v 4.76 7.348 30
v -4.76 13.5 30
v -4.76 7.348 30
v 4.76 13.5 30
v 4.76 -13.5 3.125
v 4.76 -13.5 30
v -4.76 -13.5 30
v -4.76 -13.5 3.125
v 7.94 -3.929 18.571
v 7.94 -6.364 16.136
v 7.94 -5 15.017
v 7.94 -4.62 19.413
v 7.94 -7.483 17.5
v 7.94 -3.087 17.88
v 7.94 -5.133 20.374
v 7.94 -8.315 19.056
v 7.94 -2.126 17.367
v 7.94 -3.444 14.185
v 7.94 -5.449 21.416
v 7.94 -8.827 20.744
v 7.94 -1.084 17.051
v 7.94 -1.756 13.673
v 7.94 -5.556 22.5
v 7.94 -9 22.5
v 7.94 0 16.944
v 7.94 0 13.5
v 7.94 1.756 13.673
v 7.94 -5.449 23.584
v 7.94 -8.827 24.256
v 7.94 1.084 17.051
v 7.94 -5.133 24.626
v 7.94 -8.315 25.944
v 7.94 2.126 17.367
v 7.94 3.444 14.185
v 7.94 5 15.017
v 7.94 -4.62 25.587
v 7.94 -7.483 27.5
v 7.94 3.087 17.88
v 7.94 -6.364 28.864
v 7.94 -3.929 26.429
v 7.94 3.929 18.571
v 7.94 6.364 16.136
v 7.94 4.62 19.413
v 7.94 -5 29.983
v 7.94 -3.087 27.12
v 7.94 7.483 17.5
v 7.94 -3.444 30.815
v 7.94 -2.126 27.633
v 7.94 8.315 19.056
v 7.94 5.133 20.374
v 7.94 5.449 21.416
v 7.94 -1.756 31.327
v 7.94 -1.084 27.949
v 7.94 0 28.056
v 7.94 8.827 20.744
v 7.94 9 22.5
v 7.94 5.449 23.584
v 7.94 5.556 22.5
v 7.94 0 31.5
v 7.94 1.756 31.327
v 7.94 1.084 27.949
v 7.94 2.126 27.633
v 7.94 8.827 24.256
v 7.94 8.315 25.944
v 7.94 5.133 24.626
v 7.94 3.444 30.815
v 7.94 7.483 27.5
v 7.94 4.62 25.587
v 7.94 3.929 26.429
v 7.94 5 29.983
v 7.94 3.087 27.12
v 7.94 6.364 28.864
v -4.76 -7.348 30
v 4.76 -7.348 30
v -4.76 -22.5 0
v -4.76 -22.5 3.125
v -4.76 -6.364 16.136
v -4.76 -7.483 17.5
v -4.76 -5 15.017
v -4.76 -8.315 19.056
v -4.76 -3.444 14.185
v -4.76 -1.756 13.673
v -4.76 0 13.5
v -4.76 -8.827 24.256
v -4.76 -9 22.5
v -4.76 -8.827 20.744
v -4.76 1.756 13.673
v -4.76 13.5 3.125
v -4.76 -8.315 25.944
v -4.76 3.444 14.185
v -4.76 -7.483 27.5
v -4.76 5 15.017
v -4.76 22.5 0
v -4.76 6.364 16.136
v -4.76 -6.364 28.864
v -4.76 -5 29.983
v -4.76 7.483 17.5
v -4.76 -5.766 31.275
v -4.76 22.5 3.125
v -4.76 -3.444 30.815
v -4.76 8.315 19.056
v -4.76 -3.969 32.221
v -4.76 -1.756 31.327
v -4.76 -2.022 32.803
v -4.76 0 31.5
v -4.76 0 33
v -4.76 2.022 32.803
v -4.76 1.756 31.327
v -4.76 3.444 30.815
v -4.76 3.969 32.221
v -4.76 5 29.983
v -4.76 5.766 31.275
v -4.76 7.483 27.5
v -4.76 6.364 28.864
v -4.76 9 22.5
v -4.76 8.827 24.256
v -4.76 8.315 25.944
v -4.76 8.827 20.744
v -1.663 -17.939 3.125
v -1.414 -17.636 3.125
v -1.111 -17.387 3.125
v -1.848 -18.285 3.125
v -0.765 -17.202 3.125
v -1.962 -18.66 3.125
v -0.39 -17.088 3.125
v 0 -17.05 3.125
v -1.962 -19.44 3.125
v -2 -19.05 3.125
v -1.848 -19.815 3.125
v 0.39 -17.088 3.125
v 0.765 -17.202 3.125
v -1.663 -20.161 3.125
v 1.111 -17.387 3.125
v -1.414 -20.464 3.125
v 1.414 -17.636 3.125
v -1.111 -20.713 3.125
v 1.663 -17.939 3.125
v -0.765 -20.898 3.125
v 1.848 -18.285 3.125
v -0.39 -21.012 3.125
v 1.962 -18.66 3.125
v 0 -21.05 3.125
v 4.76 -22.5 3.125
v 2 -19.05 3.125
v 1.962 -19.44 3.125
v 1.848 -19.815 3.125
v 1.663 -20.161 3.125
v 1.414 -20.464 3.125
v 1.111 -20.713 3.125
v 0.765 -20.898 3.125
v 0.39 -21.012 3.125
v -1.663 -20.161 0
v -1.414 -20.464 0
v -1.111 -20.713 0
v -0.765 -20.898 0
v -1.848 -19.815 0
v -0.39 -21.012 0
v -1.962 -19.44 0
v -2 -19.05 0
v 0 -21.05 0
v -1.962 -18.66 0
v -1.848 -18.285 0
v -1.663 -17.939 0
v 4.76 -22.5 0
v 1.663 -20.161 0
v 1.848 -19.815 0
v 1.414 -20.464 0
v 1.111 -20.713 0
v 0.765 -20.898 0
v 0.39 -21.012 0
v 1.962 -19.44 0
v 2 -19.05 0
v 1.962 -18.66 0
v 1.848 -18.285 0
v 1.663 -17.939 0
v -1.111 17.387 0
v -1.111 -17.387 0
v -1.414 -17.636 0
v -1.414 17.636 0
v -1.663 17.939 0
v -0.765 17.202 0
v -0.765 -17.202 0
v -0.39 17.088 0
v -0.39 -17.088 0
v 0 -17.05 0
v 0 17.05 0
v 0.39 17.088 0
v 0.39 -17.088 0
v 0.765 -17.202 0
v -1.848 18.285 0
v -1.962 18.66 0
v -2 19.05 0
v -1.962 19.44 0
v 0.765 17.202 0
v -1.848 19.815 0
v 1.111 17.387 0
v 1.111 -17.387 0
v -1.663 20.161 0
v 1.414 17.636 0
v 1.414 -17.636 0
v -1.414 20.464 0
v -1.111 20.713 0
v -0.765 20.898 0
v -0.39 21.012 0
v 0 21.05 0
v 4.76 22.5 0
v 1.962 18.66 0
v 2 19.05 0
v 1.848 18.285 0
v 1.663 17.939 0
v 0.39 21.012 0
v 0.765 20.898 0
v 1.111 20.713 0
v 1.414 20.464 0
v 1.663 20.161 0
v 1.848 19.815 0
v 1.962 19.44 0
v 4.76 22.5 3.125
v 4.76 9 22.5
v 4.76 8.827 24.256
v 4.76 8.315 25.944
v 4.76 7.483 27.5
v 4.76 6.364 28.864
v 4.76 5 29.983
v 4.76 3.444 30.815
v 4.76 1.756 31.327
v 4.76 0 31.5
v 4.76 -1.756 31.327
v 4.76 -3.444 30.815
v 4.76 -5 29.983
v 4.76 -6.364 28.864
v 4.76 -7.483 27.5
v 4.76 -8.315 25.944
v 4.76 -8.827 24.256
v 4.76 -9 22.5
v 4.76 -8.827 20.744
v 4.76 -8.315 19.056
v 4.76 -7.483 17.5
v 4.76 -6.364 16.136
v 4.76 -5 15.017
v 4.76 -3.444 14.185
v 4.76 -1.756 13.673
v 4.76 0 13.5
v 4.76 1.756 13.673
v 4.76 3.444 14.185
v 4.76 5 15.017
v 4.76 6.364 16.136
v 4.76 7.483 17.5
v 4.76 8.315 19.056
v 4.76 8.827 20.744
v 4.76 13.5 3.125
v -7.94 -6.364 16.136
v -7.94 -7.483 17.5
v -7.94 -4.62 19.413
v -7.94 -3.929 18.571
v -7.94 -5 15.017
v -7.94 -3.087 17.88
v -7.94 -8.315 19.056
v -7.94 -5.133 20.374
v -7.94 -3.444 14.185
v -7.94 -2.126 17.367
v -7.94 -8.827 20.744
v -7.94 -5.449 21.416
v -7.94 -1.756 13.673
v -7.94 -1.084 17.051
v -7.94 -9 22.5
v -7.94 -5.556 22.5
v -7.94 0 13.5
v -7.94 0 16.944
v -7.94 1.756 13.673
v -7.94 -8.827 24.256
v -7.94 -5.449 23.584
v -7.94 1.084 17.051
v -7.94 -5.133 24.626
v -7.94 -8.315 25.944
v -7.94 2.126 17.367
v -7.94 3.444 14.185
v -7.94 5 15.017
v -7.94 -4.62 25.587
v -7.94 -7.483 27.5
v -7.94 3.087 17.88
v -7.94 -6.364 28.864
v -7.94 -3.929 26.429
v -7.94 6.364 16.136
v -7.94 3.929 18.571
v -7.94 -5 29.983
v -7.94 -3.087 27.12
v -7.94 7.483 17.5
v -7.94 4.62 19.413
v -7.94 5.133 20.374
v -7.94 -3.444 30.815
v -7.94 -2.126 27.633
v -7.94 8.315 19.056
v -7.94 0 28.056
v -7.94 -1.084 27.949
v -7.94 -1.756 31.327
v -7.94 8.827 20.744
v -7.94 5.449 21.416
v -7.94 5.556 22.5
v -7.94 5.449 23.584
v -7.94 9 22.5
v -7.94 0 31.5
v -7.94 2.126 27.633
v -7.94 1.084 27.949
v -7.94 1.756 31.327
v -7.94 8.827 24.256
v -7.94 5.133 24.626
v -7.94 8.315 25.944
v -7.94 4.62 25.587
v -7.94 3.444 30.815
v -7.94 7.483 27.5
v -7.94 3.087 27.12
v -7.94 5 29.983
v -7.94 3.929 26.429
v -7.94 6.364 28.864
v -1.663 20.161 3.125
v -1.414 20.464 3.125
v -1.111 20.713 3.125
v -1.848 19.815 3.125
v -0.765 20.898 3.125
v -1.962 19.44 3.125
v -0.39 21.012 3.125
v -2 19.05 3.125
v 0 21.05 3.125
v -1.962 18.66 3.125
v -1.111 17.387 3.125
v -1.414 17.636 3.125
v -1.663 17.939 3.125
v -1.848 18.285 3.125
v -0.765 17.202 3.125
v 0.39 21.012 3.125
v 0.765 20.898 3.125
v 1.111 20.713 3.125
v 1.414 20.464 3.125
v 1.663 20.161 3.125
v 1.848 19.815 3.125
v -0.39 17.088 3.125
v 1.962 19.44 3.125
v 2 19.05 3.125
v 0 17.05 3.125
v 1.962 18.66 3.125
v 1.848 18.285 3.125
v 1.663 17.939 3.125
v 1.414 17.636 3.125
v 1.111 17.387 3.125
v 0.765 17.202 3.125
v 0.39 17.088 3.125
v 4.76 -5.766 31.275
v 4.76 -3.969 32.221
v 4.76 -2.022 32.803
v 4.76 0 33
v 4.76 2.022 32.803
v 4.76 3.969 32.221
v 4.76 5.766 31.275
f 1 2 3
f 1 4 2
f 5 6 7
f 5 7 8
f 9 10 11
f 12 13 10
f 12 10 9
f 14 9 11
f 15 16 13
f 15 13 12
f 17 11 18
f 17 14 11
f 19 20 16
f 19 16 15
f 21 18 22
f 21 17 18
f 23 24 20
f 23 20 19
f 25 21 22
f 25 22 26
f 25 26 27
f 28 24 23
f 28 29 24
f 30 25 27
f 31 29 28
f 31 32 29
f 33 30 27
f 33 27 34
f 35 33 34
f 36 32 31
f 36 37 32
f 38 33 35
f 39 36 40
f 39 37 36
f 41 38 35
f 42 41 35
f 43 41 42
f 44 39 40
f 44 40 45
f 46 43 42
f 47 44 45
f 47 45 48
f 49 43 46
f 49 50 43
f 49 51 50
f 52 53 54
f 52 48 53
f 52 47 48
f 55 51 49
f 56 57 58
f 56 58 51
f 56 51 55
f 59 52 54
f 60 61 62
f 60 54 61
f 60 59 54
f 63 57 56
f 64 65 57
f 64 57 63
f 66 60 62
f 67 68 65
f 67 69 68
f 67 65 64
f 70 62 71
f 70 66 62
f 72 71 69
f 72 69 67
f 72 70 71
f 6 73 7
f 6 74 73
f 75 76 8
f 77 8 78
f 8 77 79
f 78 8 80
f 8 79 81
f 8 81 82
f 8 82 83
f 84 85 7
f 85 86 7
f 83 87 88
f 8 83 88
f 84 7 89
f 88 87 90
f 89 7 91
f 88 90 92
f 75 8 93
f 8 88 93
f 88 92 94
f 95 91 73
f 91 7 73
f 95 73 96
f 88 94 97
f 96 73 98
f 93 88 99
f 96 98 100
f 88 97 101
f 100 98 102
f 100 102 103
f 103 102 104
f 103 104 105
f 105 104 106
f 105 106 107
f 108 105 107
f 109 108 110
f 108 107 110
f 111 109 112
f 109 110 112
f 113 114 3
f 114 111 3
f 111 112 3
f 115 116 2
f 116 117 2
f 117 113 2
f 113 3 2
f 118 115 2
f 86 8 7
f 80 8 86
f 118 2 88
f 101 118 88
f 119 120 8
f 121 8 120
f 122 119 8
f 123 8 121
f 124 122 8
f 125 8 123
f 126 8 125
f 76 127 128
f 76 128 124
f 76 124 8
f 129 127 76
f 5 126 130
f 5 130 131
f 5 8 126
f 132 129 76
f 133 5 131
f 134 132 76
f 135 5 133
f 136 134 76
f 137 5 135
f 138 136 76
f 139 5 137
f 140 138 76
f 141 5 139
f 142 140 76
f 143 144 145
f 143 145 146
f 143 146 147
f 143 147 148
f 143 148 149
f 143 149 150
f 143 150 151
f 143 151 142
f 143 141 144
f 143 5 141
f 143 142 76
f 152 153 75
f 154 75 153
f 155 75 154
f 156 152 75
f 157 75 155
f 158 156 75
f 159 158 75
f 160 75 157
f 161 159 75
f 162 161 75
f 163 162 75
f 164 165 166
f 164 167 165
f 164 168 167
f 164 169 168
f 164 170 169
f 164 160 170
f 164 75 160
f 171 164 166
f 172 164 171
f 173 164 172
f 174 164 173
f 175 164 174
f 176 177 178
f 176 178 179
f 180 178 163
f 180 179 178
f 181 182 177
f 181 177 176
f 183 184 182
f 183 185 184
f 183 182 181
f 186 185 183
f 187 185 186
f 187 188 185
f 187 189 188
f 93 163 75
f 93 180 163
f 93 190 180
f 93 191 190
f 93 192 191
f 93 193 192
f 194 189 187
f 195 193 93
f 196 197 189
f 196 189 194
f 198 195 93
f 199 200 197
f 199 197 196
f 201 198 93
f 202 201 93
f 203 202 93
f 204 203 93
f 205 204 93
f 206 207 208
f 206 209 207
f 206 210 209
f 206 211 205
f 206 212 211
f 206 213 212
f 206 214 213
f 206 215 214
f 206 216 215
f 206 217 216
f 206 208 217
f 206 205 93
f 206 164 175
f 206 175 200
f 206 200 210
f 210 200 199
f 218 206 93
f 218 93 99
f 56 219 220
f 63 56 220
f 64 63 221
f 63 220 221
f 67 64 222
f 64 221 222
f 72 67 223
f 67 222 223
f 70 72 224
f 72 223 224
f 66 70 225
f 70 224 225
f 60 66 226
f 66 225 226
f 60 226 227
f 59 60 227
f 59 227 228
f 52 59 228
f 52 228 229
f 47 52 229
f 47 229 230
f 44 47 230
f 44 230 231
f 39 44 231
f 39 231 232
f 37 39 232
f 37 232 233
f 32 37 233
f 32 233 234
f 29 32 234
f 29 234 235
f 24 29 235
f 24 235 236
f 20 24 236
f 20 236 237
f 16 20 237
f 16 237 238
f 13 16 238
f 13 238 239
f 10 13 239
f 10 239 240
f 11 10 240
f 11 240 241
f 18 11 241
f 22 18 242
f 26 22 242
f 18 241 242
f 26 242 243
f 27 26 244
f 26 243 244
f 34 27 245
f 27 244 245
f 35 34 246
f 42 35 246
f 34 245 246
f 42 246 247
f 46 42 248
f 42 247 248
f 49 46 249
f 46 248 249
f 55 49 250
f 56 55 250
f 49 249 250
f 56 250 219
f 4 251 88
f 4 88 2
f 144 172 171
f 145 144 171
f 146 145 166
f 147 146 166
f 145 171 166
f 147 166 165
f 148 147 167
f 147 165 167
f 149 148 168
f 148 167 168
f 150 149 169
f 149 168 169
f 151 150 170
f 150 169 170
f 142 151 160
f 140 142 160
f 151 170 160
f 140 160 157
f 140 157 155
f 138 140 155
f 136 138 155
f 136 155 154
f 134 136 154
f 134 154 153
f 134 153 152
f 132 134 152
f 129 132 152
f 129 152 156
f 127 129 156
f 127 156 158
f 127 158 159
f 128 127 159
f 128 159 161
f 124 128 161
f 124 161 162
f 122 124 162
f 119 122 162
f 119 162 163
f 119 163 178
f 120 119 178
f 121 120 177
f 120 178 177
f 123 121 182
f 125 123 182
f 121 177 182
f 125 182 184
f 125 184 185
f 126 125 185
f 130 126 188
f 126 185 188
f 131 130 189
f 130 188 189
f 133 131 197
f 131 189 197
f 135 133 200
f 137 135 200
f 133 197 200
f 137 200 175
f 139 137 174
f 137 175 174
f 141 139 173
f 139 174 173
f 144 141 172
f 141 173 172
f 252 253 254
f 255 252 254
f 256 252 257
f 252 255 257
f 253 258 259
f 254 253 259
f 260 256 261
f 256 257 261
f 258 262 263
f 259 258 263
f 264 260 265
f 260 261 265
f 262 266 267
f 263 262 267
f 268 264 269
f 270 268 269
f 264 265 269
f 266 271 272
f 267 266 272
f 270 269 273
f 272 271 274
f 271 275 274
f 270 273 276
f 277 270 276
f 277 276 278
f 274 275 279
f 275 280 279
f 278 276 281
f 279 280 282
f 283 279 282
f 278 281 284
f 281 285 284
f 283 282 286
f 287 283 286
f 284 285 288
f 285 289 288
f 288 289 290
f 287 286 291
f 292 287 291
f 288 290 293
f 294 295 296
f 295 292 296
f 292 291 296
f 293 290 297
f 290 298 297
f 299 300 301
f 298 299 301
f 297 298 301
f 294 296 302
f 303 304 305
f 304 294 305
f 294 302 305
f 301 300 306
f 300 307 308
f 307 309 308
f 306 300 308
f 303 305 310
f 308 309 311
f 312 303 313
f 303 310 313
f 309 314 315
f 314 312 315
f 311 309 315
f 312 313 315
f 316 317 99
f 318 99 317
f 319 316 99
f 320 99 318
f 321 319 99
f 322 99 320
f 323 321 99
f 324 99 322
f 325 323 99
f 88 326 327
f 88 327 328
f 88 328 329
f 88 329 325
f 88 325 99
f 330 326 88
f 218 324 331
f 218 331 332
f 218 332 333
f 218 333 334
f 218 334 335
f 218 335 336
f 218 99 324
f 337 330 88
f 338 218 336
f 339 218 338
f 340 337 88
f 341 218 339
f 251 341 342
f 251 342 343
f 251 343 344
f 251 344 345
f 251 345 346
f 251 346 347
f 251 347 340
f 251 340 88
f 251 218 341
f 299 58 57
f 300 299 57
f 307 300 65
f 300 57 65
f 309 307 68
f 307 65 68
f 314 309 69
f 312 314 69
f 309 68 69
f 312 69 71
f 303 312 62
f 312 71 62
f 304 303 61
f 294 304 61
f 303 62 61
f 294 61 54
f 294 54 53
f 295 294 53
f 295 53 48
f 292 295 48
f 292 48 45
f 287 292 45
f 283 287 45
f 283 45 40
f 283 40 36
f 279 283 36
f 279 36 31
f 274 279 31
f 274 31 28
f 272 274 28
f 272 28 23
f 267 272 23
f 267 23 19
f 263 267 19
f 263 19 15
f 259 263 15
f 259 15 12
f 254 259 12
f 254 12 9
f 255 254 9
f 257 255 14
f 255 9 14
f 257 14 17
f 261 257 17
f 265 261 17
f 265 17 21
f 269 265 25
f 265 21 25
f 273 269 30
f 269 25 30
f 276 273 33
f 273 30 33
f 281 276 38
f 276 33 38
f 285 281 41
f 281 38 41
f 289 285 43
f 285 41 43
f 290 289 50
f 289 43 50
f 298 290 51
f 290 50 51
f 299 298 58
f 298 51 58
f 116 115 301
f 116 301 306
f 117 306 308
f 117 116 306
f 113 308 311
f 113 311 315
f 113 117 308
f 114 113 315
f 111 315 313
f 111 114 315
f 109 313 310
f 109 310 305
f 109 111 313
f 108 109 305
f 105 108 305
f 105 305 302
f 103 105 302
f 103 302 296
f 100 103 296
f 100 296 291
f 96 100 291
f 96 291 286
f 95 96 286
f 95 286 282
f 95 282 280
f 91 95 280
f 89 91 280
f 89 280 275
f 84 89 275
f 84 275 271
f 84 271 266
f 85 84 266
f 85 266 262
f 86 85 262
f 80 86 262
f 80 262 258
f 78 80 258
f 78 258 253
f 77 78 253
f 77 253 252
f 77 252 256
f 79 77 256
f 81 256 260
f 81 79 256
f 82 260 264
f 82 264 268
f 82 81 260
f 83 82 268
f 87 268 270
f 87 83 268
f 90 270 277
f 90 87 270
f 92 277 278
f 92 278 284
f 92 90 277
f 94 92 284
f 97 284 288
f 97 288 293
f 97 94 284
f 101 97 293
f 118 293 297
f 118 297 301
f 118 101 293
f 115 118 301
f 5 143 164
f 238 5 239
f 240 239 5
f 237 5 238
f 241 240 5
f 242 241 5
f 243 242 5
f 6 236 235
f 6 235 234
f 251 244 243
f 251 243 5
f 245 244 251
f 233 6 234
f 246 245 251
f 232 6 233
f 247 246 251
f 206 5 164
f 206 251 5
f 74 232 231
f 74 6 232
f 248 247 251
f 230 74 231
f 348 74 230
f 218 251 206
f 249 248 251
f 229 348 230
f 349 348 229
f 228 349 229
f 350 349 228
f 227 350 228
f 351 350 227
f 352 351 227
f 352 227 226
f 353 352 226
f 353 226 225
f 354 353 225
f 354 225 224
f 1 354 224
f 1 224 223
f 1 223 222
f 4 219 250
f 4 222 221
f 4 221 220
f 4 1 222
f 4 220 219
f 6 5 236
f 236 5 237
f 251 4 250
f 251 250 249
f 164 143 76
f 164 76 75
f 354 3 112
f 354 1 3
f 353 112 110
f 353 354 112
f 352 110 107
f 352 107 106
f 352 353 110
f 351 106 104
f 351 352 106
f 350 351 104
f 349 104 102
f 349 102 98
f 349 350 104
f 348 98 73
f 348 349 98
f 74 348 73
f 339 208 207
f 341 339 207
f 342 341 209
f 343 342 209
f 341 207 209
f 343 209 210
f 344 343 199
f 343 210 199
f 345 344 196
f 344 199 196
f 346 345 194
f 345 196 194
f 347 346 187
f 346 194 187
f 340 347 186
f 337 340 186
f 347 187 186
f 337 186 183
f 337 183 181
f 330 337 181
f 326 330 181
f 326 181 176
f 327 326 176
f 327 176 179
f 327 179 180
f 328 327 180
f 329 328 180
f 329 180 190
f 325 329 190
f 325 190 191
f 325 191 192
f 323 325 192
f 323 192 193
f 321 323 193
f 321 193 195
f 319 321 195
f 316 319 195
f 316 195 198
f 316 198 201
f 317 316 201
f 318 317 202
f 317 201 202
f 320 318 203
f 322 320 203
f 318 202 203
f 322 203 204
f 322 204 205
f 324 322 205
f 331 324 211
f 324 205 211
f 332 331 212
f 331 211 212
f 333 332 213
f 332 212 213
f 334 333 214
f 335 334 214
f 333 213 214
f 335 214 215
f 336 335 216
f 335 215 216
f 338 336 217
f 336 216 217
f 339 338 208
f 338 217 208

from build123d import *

# Parameters (mm, degrees)
F1_DEPTH      = 4.76
F1_DEPTH_BACK = 4.76
F2_R          = 9
F3_DEPTH      = 7.94
F3_DEPTH_BACK = 7.94
F4_R          = 5.55625
F5_DEPTH      = 15.881
F6_R          = 2
F7_DEPTH      = 33.001


with BuildPart() as f1:
    # F0 (on Right) → F1 (new body, two sides)
    with BuildSketch(Plane.YZ) as f1_sk:
        with BuildLine():
            Line((-7.348469, 30), (-13.5, 30))
            Line((-13.5, 30), (-13.5, 3.125))
            Line((-13.5, 3.125), (-22.5, 3.125))
            Line((-22.5, 3.125), (-22.5, 0))
            Line((-22.5, 0), (22.5, 0))
            Line((22.5, 0), (22.5, 3.125))
            Line((22.5, 3.125), (13.5, 3.125))
            Line((13.5, 3.125), (13.5, 30))
            Line((13.5, 30), (7.348469, 30))
            ThreePointArc((7.348469, 30), (0, 33), (-7.348469, 30))
        make_face()
    extrude(amount=F1_DEPTH)
    extrude(f1_sk.sketch, amount=-F1_DEPTH_BACK)

    # F2 (on Right) → F3 (join, two sides)
    with BuildSketch(Plane.YZ) as f3_sk:
        with Locations((0, 22.5)):
            Circle(F2_R)
    extrude(amount=F3_DEPTH)
    extrude(f3_sk.sketch, amount=-F3_DEPTH_BACK)

    # F4 (on face) → F5 (cut, through all)
    with BuildSketch(Plane.YZ.offset(7.94)):
        with Locations((0, 22.5)):
            Circle(F4_R)
    extrude(amount=-F5_DEPTH, mode=Mode.SUBTRACT)

    # F6 (on face) → F7 (cut, through all)
    with BuildSketch(Plane(origin=(0, 0, 0), x_dir=(1, 0, 0), z_dir=(0, 0, -1))):
        with Locations((0, 19.05)):
            Circle(F6_R)
        with Locations((0, -19.05)):
            Circle(F6_R)
    extrude(amount=-F7_DEPTH, mode=Mode.SUBTRACT)


solid = f1.part
